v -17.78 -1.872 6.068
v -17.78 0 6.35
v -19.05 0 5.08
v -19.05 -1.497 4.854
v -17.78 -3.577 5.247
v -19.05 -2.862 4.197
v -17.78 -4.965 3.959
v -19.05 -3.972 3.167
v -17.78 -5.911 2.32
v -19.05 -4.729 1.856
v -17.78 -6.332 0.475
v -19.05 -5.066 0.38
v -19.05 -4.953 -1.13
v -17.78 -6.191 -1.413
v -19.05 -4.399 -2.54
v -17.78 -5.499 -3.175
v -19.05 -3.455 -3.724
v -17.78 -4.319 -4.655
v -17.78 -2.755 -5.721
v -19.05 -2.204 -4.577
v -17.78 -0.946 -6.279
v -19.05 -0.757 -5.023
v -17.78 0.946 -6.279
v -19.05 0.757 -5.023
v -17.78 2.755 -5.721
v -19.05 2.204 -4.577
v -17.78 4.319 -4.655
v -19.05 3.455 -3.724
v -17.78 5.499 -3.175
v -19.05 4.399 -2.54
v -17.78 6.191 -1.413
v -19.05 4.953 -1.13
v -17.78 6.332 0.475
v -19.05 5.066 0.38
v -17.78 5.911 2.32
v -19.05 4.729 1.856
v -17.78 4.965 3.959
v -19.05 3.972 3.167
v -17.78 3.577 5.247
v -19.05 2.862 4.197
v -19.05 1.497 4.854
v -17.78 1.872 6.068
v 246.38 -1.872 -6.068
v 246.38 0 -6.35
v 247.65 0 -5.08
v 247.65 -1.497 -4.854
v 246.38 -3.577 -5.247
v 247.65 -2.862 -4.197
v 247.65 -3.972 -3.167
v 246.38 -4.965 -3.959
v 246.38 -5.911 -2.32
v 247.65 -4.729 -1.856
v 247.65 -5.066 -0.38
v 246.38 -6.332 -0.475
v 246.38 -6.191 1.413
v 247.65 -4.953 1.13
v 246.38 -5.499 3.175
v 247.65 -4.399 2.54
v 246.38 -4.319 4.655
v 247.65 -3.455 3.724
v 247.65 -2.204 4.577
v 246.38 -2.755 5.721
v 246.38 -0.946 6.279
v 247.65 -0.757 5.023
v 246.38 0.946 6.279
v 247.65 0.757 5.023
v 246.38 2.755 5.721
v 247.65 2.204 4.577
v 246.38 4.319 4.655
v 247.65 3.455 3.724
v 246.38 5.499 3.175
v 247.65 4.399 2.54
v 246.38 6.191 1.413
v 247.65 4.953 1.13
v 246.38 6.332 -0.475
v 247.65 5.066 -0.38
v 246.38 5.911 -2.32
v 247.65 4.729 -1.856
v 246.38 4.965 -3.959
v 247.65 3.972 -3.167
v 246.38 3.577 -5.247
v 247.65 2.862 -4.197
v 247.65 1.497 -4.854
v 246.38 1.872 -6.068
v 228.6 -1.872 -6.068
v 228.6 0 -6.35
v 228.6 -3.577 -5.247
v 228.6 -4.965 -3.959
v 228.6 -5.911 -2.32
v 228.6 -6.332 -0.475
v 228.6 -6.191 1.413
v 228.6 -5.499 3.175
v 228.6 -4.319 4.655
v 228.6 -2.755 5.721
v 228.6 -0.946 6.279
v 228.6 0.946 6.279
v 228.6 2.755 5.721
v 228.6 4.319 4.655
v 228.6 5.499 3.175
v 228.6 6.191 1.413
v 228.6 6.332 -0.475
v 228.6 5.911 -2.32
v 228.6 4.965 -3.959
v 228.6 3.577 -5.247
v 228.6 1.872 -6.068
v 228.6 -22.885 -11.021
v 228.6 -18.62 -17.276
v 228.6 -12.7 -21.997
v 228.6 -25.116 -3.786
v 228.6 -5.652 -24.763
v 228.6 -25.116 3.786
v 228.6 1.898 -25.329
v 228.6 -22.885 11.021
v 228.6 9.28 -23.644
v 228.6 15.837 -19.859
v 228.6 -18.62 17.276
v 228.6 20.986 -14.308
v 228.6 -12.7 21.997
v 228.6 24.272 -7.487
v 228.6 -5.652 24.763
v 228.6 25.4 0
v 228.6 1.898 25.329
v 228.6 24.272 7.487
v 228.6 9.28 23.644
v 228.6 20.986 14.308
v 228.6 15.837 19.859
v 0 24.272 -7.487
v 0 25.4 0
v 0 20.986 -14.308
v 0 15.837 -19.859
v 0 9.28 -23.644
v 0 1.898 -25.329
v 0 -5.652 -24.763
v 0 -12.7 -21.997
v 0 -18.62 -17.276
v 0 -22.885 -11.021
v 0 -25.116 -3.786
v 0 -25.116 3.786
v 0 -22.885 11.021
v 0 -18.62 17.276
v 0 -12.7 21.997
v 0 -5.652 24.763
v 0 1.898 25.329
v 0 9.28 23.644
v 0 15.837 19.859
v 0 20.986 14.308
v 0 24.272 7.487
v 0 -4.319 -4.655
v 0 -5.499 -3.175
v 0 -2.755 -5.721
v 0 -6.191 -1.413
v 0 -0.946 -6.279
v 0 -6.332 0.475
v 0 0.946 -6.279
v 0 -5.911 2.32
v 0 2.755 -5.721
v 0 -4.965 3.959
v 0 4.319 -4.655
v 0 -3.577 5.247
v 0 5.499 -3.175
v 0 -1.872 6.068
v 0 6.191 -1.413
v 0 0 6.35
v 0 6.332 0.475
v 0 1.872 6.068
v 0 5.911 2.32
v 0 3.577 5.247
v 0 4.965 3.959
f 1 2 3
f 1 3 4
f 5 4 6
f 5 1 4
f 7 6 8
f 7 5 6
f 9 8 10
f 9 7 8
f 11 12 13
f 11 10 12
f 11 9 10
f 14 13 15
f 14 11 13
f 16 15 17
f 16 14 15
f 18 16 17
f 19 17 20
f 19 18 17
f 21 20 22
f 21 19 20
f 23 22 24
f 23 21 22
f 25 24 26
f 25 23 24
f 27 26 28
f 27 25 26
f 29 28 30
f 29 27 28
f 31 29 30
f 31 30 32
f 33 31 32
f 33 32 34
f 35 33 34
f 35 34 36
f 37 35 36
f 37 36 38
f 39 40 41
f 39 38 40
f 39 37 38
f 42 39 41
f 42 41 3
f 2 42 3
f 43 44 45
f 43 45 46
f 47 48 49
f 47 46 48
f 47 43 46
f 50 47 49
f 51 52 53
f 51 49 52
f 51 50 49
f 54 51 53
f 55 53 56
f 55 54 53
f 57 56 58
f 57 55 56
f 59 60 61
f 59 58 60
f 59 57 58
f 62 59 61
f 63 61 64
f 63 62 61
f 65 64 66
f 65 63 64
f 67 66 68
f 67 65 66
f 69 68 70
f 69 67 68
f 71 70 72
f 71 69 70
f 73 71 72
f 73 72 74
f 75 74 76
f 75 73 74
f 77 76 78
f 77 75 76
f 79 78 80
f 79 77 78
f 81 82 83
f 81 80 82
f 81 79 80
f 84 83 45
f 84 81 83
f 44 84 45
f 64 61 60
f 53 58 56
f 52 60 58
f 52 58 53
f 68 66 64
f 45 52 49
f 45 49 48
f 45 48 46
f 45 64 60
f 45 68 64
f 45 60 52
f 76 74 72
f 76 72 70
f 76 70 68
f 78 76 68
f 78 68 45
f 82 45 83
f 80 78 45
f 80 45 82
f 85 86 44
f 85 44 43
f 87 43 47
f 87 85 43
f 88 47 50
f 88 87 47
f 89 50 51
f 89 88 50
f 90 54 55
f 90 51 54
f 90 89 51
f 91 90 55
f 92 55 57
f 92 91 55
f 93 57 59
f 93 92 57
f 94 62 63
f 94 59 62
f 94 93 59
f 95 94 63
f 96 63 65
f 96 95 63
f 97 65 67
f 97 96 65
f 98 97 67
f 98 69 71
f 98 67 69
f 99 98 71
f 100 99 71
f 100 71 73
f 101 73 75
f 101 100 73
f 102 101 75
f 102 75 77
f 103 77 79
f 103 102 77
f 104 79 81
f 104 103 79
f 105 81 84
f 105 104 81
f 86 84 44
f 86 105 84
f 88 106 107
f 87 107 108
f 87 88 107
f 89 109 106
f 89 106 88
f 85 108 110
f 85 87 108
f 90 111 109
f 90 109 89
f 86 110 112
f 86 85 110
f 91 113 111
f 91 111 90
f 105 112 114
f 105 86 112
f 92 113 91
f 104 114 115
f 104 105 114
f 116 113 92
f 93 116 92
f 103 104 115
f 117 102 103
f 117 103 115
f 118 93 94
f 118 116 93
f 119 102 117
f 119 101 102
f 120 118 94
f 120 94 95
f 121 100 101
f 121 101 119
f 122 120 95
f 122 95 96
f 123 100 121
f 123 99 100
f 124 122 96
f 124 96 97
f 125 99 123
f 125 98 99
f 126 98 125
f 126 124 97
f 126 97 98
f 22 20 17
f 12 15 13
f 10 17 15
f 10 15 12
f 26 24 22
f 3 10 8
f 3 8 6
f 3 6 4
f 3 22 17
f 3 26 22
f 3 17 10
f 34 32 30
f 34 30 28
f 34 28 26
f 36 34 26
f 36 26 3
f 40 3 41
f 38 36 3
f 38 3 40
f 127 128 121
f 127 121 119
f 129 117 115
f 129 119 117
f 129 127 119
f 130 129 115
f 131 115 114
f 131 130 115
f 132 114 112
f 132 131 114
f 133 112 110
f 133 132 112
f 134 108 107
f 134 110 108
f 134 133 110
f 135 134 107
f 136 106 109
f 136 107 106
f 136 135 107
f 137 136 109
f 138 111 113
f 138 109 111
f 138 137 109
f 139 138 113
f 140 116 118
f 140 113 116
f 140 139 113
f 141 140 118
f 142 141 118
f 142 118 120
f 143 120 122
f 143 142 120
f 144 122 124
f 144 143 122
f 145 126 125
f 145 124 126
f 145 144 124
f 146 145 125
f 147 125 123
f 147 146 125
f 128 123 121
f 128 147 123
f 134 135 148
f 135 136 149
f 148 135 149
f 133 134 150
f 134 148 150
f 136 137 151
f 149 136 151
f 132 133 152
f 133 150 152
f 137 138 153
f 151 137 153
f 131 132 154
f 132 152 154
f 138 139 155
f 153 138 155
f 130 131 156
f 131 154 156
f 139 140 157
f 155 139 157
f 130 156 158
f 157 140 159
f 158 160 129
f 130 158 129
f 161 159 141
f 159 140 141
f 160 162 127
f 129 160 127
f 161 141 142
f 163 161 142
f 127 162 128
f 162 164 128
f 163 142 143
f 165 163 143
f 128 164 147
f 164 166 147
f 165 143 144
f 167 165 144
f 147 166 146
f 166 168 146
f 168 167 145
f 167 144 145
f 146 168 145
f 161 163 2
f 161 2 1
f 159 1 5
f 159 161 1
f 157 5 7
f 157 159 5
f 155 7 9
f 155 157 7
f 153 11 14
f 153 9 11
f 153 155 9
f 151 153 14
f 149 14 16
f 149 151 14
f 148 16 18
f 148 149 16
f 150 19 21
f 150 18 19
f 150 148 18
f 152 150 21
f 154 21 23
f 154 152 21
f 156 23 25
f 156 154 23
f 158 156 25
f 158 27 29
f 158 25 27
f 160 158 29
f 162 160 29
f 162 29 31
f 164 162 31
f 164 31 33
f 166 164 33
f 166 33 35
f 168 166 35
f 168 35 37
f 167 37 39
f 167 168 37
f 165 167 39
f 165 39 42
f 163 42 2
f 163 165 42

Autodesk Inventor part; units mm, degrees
ref_plane "YZ Plane" through (0, 0, 0) normal (1, 0, 0) x (0, 1, 0)
ref_plane "XZ Plane" through (0, 0, 0) normal (0, 1, 0) x (-1, 0, 0)
ref_plane "XY Plane" through (0, 0, 0) normal (0, 0, 1) x (1, 0, 0)
sketch "Sketch1" plane through (0, 0, 0) normal (1, 0, 0) x (0, 1, 0)
  circle A0 centre (0, 0) radius 25.4
  dimension "d0" = 50.8
extrude "Extrusion1" add sketch "Sketch1" along normal blind 228.6
sketch "Sketch2" plane through (228.6, 0, 0) normal (1, 0, 0) x (0, 0, -1)
  circle A0 centre (0, 0) radius 6.35
  dimension "d3" = 12.7
extrude "Extrusion2" add sketch "Sketch2" along normal blind 19.05
chamfer "Chamfer1" distance 1.27 angle 45 1 edges at (247.65, 0, 6.35)
sketch "Sketch3" plane through (0, 0, 0) normal (-1, 0, 0) x (0, 0, 1)
  circle A0 centre (0, 0) radius 6.35 projected
  circle A1 centre (0, 0) radius 6.35
extrude "Extrusion3" add sketch "Sketch3" along normal blind 19.05
chamfer "Chamfer2" distance 1.27 angle 45 1 edges at (-19.05, 0, -6.35)
properties part number "Roller Pin"
